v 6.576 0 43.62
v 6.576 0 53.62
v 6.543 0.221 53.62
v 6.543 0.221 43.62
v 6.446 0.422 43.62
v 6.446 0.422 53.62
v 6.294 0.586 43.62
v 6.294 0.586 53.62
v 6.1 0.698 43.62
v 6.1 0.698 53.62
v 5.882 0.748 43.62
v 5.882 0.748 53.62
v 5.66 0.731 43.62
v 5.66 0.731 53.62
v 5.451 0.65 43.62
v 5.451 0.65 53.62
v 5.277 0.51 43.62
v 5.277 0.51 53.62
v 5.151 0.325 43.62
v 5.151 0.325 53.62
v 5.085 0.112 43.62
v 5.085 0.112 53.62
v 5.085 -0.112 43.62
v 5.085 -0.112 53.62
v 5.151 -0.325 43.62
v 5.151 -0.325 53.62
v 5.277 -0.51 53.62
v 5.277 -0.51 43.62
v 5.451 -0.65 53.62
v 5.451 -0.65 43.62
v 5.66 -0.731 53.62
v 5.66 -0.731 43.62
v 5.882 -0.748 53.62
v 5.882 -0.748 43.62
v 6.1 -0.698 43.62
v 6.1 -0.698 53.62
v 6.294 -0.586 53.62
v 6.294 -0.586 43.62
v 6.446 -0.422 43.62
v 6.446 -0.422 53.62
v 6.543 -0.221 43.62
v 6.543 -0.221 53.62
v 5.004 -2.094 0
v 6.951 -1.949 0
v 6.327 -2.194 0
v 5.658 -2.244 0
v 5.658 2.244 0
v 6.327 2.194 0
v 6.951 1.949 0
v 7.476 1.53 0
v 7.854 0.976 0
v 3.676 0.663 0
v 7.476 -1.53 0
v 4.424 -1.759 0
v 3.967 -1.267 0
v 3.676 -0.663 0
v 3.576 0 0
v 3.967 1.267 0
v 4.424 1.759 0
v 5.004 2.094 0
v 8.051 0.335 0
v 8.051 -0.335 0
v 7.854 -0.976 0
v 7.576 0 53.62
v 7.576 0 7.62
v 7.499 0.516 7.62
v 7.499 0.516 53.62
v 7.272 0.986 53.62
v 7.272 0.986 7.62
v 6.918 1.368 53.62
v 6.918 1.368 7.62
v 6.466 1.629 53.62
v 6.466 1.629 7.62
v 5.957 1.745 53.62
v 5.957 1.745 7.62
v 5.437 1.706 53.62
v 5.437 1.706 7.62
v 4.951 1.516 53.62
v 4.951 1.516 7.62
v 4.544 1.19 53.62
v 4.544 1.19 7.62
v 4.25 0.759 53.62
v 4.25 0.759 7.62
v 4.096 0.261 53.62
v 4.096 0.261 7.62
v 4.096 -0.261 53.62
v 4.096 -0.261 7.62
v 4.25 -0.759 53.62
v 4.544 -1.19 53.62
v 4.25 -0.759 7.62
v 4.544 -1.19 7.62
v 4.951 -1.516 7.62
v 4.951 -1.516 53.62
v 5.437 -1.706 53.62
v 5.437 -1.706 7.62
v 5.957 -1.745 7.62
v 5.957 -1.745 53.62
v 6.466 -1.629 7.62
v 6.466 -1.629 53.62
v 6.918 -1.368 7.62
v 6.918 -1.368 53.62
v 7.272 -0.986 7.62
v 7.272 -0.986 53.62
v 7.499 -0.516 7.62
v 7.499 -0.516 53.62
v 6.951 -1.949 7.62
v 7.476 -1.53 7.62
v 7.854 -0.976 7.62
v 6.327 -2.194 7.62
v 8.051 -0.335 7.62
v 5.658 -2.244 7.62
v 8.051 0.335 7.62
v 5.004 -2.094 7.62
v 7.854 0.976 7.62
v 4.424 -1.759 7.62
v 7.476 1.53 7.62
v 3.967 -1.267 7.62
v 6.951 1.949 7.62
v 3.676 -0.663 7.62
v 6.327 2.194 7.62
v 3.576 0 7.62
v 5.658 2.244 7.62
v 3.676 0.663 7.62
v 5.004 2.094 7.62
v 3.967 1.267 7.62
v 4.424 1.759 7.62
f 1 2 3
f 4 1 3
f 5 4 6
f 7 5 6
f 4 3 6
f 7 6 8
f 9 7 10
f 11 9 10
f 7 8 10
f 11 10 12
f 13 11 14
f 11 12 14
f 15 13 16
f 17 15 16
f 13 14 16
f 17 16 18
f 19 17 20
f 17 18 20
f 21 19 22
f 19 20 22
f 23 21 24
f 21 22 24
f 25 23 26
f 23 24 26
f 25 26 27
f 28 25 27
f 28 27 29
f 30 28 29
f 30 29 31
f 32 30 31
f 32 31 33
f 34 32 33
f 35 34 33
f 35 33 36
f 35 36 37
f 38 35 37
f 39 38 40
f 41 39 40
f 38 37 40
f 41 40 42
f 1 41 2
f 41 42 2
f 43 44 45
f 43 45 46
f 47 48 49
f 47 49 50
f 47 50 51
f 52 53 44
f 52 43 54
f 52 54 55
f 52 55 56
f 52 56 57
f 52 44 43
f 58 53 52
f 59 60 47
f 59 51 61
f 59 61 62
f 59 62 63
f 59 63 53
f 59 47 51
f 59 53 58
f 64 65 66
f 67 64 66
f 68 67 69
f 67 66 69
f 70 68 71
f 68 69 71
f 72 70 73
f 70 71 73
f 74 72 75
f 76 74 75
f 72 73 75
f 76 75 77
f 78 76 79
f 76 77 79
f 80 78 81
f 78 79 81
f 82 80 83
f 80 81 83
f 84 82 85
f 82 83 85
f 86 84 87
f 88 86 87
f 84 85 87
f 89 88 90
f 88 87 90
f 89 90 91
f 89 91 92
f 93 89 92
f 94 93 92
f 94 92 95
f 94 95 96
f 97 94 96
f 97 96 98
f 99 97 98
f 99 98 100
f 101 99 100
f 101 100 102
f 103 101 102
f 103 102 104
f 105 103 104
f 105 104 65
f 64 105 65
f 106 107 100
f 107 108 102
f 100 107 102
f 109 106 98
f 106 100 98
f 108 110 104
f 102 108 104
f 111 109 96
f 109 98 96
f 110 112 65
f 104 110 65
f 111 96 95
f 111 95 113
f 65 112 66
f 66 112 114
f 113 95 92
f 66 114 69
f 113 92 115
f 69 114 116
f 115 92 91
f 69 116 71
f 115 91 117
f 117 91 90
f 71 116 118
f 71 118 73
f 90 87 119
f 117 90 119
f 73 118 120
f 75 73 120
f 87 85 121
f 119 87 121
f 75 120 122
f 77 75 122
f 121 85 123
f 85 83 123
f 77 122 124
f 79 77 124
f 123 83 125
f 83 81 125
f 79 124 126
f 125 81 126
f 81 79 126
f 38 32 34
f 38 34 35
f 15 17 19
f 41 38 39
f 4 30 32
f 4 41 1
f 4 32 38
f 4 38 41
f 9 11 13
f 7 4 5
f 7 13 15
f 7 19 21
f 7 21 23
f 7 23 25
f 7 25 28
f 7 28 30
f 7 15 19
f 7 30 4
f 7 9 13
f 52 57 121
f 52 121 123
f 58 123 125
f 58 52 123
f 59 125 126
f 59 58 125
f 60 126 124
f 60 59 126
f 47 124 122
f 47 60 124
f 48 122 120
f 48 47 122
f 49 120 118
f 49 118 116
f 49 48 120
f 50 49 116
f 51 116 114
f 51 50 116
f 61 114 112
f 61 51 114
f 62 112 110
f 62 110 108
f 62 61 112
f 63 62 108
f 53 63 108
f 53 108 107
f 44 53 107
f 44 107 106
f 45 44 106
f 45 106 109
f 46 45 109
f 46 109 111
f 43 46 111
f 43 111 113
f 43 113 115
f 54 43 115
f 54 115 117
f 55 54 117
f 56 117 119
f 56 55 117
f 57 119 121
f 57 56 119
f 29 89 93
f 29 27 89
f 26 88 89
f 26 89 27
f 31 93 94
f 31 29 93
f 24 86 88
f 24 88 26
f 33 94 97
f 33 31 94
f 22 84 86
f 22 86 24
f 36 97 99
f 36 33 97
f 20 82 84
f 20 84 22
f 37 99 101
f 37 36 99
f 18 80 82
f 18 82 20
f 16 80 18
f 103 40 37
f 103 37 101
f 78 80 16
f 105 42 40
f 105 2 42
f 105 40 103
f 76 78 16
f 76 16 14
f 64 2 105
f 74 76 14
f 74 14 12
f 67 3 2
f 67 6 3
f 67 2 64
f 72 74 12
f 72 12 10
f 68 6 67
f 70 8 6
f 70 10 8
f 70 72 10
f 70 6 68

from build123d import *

# Parameters (mm, degrees)
SKETCH1_R           = 1.75
BOSS_EXTRUDE1_DEPTH = 53.62
SKETCH3_R           = 0.75
CUT_EXTRUDE1_DEPTH  = 10
SKETCH4_R           = 2.25
BOSS_EXTRUDE2_DEPTH = 7.62


with BuildPart() as part:
    # Sketch1 → Boss-Extrude1 (new body)
    with BuildSketch(Plane.XY):
        with Locations((5.826393973, 0)):
            Circle(SKETCH1_R)
    extrude(amount=BOSS_EXTRUDE1_DEPTH)

    # Sketch3 → Cut-Extrude1 (cut)
    with BuildSketch(Plane.XY.offset(53.62)):
        with Locations((5.826393973, 0)):
            Circle(SKETCH3_R)
    extrude(amount=-CUT_EXTRUDE1_DEPTH, mode=Mode.SUBTRACT)

    # Sketch4 → Boss-Extrude2 (add)
    with BuildSketch(Plane(origin=(0, 0, 0), x_dir=(-1, 0, 0), z_dir=(0, 0, -1))):
        with Locations((-5.826393973, 0)):
            Circle(SKETCH4_R)
    extrude(amount=-BOSS_EXTRUDE2_DEPTH)


solid = part.part
